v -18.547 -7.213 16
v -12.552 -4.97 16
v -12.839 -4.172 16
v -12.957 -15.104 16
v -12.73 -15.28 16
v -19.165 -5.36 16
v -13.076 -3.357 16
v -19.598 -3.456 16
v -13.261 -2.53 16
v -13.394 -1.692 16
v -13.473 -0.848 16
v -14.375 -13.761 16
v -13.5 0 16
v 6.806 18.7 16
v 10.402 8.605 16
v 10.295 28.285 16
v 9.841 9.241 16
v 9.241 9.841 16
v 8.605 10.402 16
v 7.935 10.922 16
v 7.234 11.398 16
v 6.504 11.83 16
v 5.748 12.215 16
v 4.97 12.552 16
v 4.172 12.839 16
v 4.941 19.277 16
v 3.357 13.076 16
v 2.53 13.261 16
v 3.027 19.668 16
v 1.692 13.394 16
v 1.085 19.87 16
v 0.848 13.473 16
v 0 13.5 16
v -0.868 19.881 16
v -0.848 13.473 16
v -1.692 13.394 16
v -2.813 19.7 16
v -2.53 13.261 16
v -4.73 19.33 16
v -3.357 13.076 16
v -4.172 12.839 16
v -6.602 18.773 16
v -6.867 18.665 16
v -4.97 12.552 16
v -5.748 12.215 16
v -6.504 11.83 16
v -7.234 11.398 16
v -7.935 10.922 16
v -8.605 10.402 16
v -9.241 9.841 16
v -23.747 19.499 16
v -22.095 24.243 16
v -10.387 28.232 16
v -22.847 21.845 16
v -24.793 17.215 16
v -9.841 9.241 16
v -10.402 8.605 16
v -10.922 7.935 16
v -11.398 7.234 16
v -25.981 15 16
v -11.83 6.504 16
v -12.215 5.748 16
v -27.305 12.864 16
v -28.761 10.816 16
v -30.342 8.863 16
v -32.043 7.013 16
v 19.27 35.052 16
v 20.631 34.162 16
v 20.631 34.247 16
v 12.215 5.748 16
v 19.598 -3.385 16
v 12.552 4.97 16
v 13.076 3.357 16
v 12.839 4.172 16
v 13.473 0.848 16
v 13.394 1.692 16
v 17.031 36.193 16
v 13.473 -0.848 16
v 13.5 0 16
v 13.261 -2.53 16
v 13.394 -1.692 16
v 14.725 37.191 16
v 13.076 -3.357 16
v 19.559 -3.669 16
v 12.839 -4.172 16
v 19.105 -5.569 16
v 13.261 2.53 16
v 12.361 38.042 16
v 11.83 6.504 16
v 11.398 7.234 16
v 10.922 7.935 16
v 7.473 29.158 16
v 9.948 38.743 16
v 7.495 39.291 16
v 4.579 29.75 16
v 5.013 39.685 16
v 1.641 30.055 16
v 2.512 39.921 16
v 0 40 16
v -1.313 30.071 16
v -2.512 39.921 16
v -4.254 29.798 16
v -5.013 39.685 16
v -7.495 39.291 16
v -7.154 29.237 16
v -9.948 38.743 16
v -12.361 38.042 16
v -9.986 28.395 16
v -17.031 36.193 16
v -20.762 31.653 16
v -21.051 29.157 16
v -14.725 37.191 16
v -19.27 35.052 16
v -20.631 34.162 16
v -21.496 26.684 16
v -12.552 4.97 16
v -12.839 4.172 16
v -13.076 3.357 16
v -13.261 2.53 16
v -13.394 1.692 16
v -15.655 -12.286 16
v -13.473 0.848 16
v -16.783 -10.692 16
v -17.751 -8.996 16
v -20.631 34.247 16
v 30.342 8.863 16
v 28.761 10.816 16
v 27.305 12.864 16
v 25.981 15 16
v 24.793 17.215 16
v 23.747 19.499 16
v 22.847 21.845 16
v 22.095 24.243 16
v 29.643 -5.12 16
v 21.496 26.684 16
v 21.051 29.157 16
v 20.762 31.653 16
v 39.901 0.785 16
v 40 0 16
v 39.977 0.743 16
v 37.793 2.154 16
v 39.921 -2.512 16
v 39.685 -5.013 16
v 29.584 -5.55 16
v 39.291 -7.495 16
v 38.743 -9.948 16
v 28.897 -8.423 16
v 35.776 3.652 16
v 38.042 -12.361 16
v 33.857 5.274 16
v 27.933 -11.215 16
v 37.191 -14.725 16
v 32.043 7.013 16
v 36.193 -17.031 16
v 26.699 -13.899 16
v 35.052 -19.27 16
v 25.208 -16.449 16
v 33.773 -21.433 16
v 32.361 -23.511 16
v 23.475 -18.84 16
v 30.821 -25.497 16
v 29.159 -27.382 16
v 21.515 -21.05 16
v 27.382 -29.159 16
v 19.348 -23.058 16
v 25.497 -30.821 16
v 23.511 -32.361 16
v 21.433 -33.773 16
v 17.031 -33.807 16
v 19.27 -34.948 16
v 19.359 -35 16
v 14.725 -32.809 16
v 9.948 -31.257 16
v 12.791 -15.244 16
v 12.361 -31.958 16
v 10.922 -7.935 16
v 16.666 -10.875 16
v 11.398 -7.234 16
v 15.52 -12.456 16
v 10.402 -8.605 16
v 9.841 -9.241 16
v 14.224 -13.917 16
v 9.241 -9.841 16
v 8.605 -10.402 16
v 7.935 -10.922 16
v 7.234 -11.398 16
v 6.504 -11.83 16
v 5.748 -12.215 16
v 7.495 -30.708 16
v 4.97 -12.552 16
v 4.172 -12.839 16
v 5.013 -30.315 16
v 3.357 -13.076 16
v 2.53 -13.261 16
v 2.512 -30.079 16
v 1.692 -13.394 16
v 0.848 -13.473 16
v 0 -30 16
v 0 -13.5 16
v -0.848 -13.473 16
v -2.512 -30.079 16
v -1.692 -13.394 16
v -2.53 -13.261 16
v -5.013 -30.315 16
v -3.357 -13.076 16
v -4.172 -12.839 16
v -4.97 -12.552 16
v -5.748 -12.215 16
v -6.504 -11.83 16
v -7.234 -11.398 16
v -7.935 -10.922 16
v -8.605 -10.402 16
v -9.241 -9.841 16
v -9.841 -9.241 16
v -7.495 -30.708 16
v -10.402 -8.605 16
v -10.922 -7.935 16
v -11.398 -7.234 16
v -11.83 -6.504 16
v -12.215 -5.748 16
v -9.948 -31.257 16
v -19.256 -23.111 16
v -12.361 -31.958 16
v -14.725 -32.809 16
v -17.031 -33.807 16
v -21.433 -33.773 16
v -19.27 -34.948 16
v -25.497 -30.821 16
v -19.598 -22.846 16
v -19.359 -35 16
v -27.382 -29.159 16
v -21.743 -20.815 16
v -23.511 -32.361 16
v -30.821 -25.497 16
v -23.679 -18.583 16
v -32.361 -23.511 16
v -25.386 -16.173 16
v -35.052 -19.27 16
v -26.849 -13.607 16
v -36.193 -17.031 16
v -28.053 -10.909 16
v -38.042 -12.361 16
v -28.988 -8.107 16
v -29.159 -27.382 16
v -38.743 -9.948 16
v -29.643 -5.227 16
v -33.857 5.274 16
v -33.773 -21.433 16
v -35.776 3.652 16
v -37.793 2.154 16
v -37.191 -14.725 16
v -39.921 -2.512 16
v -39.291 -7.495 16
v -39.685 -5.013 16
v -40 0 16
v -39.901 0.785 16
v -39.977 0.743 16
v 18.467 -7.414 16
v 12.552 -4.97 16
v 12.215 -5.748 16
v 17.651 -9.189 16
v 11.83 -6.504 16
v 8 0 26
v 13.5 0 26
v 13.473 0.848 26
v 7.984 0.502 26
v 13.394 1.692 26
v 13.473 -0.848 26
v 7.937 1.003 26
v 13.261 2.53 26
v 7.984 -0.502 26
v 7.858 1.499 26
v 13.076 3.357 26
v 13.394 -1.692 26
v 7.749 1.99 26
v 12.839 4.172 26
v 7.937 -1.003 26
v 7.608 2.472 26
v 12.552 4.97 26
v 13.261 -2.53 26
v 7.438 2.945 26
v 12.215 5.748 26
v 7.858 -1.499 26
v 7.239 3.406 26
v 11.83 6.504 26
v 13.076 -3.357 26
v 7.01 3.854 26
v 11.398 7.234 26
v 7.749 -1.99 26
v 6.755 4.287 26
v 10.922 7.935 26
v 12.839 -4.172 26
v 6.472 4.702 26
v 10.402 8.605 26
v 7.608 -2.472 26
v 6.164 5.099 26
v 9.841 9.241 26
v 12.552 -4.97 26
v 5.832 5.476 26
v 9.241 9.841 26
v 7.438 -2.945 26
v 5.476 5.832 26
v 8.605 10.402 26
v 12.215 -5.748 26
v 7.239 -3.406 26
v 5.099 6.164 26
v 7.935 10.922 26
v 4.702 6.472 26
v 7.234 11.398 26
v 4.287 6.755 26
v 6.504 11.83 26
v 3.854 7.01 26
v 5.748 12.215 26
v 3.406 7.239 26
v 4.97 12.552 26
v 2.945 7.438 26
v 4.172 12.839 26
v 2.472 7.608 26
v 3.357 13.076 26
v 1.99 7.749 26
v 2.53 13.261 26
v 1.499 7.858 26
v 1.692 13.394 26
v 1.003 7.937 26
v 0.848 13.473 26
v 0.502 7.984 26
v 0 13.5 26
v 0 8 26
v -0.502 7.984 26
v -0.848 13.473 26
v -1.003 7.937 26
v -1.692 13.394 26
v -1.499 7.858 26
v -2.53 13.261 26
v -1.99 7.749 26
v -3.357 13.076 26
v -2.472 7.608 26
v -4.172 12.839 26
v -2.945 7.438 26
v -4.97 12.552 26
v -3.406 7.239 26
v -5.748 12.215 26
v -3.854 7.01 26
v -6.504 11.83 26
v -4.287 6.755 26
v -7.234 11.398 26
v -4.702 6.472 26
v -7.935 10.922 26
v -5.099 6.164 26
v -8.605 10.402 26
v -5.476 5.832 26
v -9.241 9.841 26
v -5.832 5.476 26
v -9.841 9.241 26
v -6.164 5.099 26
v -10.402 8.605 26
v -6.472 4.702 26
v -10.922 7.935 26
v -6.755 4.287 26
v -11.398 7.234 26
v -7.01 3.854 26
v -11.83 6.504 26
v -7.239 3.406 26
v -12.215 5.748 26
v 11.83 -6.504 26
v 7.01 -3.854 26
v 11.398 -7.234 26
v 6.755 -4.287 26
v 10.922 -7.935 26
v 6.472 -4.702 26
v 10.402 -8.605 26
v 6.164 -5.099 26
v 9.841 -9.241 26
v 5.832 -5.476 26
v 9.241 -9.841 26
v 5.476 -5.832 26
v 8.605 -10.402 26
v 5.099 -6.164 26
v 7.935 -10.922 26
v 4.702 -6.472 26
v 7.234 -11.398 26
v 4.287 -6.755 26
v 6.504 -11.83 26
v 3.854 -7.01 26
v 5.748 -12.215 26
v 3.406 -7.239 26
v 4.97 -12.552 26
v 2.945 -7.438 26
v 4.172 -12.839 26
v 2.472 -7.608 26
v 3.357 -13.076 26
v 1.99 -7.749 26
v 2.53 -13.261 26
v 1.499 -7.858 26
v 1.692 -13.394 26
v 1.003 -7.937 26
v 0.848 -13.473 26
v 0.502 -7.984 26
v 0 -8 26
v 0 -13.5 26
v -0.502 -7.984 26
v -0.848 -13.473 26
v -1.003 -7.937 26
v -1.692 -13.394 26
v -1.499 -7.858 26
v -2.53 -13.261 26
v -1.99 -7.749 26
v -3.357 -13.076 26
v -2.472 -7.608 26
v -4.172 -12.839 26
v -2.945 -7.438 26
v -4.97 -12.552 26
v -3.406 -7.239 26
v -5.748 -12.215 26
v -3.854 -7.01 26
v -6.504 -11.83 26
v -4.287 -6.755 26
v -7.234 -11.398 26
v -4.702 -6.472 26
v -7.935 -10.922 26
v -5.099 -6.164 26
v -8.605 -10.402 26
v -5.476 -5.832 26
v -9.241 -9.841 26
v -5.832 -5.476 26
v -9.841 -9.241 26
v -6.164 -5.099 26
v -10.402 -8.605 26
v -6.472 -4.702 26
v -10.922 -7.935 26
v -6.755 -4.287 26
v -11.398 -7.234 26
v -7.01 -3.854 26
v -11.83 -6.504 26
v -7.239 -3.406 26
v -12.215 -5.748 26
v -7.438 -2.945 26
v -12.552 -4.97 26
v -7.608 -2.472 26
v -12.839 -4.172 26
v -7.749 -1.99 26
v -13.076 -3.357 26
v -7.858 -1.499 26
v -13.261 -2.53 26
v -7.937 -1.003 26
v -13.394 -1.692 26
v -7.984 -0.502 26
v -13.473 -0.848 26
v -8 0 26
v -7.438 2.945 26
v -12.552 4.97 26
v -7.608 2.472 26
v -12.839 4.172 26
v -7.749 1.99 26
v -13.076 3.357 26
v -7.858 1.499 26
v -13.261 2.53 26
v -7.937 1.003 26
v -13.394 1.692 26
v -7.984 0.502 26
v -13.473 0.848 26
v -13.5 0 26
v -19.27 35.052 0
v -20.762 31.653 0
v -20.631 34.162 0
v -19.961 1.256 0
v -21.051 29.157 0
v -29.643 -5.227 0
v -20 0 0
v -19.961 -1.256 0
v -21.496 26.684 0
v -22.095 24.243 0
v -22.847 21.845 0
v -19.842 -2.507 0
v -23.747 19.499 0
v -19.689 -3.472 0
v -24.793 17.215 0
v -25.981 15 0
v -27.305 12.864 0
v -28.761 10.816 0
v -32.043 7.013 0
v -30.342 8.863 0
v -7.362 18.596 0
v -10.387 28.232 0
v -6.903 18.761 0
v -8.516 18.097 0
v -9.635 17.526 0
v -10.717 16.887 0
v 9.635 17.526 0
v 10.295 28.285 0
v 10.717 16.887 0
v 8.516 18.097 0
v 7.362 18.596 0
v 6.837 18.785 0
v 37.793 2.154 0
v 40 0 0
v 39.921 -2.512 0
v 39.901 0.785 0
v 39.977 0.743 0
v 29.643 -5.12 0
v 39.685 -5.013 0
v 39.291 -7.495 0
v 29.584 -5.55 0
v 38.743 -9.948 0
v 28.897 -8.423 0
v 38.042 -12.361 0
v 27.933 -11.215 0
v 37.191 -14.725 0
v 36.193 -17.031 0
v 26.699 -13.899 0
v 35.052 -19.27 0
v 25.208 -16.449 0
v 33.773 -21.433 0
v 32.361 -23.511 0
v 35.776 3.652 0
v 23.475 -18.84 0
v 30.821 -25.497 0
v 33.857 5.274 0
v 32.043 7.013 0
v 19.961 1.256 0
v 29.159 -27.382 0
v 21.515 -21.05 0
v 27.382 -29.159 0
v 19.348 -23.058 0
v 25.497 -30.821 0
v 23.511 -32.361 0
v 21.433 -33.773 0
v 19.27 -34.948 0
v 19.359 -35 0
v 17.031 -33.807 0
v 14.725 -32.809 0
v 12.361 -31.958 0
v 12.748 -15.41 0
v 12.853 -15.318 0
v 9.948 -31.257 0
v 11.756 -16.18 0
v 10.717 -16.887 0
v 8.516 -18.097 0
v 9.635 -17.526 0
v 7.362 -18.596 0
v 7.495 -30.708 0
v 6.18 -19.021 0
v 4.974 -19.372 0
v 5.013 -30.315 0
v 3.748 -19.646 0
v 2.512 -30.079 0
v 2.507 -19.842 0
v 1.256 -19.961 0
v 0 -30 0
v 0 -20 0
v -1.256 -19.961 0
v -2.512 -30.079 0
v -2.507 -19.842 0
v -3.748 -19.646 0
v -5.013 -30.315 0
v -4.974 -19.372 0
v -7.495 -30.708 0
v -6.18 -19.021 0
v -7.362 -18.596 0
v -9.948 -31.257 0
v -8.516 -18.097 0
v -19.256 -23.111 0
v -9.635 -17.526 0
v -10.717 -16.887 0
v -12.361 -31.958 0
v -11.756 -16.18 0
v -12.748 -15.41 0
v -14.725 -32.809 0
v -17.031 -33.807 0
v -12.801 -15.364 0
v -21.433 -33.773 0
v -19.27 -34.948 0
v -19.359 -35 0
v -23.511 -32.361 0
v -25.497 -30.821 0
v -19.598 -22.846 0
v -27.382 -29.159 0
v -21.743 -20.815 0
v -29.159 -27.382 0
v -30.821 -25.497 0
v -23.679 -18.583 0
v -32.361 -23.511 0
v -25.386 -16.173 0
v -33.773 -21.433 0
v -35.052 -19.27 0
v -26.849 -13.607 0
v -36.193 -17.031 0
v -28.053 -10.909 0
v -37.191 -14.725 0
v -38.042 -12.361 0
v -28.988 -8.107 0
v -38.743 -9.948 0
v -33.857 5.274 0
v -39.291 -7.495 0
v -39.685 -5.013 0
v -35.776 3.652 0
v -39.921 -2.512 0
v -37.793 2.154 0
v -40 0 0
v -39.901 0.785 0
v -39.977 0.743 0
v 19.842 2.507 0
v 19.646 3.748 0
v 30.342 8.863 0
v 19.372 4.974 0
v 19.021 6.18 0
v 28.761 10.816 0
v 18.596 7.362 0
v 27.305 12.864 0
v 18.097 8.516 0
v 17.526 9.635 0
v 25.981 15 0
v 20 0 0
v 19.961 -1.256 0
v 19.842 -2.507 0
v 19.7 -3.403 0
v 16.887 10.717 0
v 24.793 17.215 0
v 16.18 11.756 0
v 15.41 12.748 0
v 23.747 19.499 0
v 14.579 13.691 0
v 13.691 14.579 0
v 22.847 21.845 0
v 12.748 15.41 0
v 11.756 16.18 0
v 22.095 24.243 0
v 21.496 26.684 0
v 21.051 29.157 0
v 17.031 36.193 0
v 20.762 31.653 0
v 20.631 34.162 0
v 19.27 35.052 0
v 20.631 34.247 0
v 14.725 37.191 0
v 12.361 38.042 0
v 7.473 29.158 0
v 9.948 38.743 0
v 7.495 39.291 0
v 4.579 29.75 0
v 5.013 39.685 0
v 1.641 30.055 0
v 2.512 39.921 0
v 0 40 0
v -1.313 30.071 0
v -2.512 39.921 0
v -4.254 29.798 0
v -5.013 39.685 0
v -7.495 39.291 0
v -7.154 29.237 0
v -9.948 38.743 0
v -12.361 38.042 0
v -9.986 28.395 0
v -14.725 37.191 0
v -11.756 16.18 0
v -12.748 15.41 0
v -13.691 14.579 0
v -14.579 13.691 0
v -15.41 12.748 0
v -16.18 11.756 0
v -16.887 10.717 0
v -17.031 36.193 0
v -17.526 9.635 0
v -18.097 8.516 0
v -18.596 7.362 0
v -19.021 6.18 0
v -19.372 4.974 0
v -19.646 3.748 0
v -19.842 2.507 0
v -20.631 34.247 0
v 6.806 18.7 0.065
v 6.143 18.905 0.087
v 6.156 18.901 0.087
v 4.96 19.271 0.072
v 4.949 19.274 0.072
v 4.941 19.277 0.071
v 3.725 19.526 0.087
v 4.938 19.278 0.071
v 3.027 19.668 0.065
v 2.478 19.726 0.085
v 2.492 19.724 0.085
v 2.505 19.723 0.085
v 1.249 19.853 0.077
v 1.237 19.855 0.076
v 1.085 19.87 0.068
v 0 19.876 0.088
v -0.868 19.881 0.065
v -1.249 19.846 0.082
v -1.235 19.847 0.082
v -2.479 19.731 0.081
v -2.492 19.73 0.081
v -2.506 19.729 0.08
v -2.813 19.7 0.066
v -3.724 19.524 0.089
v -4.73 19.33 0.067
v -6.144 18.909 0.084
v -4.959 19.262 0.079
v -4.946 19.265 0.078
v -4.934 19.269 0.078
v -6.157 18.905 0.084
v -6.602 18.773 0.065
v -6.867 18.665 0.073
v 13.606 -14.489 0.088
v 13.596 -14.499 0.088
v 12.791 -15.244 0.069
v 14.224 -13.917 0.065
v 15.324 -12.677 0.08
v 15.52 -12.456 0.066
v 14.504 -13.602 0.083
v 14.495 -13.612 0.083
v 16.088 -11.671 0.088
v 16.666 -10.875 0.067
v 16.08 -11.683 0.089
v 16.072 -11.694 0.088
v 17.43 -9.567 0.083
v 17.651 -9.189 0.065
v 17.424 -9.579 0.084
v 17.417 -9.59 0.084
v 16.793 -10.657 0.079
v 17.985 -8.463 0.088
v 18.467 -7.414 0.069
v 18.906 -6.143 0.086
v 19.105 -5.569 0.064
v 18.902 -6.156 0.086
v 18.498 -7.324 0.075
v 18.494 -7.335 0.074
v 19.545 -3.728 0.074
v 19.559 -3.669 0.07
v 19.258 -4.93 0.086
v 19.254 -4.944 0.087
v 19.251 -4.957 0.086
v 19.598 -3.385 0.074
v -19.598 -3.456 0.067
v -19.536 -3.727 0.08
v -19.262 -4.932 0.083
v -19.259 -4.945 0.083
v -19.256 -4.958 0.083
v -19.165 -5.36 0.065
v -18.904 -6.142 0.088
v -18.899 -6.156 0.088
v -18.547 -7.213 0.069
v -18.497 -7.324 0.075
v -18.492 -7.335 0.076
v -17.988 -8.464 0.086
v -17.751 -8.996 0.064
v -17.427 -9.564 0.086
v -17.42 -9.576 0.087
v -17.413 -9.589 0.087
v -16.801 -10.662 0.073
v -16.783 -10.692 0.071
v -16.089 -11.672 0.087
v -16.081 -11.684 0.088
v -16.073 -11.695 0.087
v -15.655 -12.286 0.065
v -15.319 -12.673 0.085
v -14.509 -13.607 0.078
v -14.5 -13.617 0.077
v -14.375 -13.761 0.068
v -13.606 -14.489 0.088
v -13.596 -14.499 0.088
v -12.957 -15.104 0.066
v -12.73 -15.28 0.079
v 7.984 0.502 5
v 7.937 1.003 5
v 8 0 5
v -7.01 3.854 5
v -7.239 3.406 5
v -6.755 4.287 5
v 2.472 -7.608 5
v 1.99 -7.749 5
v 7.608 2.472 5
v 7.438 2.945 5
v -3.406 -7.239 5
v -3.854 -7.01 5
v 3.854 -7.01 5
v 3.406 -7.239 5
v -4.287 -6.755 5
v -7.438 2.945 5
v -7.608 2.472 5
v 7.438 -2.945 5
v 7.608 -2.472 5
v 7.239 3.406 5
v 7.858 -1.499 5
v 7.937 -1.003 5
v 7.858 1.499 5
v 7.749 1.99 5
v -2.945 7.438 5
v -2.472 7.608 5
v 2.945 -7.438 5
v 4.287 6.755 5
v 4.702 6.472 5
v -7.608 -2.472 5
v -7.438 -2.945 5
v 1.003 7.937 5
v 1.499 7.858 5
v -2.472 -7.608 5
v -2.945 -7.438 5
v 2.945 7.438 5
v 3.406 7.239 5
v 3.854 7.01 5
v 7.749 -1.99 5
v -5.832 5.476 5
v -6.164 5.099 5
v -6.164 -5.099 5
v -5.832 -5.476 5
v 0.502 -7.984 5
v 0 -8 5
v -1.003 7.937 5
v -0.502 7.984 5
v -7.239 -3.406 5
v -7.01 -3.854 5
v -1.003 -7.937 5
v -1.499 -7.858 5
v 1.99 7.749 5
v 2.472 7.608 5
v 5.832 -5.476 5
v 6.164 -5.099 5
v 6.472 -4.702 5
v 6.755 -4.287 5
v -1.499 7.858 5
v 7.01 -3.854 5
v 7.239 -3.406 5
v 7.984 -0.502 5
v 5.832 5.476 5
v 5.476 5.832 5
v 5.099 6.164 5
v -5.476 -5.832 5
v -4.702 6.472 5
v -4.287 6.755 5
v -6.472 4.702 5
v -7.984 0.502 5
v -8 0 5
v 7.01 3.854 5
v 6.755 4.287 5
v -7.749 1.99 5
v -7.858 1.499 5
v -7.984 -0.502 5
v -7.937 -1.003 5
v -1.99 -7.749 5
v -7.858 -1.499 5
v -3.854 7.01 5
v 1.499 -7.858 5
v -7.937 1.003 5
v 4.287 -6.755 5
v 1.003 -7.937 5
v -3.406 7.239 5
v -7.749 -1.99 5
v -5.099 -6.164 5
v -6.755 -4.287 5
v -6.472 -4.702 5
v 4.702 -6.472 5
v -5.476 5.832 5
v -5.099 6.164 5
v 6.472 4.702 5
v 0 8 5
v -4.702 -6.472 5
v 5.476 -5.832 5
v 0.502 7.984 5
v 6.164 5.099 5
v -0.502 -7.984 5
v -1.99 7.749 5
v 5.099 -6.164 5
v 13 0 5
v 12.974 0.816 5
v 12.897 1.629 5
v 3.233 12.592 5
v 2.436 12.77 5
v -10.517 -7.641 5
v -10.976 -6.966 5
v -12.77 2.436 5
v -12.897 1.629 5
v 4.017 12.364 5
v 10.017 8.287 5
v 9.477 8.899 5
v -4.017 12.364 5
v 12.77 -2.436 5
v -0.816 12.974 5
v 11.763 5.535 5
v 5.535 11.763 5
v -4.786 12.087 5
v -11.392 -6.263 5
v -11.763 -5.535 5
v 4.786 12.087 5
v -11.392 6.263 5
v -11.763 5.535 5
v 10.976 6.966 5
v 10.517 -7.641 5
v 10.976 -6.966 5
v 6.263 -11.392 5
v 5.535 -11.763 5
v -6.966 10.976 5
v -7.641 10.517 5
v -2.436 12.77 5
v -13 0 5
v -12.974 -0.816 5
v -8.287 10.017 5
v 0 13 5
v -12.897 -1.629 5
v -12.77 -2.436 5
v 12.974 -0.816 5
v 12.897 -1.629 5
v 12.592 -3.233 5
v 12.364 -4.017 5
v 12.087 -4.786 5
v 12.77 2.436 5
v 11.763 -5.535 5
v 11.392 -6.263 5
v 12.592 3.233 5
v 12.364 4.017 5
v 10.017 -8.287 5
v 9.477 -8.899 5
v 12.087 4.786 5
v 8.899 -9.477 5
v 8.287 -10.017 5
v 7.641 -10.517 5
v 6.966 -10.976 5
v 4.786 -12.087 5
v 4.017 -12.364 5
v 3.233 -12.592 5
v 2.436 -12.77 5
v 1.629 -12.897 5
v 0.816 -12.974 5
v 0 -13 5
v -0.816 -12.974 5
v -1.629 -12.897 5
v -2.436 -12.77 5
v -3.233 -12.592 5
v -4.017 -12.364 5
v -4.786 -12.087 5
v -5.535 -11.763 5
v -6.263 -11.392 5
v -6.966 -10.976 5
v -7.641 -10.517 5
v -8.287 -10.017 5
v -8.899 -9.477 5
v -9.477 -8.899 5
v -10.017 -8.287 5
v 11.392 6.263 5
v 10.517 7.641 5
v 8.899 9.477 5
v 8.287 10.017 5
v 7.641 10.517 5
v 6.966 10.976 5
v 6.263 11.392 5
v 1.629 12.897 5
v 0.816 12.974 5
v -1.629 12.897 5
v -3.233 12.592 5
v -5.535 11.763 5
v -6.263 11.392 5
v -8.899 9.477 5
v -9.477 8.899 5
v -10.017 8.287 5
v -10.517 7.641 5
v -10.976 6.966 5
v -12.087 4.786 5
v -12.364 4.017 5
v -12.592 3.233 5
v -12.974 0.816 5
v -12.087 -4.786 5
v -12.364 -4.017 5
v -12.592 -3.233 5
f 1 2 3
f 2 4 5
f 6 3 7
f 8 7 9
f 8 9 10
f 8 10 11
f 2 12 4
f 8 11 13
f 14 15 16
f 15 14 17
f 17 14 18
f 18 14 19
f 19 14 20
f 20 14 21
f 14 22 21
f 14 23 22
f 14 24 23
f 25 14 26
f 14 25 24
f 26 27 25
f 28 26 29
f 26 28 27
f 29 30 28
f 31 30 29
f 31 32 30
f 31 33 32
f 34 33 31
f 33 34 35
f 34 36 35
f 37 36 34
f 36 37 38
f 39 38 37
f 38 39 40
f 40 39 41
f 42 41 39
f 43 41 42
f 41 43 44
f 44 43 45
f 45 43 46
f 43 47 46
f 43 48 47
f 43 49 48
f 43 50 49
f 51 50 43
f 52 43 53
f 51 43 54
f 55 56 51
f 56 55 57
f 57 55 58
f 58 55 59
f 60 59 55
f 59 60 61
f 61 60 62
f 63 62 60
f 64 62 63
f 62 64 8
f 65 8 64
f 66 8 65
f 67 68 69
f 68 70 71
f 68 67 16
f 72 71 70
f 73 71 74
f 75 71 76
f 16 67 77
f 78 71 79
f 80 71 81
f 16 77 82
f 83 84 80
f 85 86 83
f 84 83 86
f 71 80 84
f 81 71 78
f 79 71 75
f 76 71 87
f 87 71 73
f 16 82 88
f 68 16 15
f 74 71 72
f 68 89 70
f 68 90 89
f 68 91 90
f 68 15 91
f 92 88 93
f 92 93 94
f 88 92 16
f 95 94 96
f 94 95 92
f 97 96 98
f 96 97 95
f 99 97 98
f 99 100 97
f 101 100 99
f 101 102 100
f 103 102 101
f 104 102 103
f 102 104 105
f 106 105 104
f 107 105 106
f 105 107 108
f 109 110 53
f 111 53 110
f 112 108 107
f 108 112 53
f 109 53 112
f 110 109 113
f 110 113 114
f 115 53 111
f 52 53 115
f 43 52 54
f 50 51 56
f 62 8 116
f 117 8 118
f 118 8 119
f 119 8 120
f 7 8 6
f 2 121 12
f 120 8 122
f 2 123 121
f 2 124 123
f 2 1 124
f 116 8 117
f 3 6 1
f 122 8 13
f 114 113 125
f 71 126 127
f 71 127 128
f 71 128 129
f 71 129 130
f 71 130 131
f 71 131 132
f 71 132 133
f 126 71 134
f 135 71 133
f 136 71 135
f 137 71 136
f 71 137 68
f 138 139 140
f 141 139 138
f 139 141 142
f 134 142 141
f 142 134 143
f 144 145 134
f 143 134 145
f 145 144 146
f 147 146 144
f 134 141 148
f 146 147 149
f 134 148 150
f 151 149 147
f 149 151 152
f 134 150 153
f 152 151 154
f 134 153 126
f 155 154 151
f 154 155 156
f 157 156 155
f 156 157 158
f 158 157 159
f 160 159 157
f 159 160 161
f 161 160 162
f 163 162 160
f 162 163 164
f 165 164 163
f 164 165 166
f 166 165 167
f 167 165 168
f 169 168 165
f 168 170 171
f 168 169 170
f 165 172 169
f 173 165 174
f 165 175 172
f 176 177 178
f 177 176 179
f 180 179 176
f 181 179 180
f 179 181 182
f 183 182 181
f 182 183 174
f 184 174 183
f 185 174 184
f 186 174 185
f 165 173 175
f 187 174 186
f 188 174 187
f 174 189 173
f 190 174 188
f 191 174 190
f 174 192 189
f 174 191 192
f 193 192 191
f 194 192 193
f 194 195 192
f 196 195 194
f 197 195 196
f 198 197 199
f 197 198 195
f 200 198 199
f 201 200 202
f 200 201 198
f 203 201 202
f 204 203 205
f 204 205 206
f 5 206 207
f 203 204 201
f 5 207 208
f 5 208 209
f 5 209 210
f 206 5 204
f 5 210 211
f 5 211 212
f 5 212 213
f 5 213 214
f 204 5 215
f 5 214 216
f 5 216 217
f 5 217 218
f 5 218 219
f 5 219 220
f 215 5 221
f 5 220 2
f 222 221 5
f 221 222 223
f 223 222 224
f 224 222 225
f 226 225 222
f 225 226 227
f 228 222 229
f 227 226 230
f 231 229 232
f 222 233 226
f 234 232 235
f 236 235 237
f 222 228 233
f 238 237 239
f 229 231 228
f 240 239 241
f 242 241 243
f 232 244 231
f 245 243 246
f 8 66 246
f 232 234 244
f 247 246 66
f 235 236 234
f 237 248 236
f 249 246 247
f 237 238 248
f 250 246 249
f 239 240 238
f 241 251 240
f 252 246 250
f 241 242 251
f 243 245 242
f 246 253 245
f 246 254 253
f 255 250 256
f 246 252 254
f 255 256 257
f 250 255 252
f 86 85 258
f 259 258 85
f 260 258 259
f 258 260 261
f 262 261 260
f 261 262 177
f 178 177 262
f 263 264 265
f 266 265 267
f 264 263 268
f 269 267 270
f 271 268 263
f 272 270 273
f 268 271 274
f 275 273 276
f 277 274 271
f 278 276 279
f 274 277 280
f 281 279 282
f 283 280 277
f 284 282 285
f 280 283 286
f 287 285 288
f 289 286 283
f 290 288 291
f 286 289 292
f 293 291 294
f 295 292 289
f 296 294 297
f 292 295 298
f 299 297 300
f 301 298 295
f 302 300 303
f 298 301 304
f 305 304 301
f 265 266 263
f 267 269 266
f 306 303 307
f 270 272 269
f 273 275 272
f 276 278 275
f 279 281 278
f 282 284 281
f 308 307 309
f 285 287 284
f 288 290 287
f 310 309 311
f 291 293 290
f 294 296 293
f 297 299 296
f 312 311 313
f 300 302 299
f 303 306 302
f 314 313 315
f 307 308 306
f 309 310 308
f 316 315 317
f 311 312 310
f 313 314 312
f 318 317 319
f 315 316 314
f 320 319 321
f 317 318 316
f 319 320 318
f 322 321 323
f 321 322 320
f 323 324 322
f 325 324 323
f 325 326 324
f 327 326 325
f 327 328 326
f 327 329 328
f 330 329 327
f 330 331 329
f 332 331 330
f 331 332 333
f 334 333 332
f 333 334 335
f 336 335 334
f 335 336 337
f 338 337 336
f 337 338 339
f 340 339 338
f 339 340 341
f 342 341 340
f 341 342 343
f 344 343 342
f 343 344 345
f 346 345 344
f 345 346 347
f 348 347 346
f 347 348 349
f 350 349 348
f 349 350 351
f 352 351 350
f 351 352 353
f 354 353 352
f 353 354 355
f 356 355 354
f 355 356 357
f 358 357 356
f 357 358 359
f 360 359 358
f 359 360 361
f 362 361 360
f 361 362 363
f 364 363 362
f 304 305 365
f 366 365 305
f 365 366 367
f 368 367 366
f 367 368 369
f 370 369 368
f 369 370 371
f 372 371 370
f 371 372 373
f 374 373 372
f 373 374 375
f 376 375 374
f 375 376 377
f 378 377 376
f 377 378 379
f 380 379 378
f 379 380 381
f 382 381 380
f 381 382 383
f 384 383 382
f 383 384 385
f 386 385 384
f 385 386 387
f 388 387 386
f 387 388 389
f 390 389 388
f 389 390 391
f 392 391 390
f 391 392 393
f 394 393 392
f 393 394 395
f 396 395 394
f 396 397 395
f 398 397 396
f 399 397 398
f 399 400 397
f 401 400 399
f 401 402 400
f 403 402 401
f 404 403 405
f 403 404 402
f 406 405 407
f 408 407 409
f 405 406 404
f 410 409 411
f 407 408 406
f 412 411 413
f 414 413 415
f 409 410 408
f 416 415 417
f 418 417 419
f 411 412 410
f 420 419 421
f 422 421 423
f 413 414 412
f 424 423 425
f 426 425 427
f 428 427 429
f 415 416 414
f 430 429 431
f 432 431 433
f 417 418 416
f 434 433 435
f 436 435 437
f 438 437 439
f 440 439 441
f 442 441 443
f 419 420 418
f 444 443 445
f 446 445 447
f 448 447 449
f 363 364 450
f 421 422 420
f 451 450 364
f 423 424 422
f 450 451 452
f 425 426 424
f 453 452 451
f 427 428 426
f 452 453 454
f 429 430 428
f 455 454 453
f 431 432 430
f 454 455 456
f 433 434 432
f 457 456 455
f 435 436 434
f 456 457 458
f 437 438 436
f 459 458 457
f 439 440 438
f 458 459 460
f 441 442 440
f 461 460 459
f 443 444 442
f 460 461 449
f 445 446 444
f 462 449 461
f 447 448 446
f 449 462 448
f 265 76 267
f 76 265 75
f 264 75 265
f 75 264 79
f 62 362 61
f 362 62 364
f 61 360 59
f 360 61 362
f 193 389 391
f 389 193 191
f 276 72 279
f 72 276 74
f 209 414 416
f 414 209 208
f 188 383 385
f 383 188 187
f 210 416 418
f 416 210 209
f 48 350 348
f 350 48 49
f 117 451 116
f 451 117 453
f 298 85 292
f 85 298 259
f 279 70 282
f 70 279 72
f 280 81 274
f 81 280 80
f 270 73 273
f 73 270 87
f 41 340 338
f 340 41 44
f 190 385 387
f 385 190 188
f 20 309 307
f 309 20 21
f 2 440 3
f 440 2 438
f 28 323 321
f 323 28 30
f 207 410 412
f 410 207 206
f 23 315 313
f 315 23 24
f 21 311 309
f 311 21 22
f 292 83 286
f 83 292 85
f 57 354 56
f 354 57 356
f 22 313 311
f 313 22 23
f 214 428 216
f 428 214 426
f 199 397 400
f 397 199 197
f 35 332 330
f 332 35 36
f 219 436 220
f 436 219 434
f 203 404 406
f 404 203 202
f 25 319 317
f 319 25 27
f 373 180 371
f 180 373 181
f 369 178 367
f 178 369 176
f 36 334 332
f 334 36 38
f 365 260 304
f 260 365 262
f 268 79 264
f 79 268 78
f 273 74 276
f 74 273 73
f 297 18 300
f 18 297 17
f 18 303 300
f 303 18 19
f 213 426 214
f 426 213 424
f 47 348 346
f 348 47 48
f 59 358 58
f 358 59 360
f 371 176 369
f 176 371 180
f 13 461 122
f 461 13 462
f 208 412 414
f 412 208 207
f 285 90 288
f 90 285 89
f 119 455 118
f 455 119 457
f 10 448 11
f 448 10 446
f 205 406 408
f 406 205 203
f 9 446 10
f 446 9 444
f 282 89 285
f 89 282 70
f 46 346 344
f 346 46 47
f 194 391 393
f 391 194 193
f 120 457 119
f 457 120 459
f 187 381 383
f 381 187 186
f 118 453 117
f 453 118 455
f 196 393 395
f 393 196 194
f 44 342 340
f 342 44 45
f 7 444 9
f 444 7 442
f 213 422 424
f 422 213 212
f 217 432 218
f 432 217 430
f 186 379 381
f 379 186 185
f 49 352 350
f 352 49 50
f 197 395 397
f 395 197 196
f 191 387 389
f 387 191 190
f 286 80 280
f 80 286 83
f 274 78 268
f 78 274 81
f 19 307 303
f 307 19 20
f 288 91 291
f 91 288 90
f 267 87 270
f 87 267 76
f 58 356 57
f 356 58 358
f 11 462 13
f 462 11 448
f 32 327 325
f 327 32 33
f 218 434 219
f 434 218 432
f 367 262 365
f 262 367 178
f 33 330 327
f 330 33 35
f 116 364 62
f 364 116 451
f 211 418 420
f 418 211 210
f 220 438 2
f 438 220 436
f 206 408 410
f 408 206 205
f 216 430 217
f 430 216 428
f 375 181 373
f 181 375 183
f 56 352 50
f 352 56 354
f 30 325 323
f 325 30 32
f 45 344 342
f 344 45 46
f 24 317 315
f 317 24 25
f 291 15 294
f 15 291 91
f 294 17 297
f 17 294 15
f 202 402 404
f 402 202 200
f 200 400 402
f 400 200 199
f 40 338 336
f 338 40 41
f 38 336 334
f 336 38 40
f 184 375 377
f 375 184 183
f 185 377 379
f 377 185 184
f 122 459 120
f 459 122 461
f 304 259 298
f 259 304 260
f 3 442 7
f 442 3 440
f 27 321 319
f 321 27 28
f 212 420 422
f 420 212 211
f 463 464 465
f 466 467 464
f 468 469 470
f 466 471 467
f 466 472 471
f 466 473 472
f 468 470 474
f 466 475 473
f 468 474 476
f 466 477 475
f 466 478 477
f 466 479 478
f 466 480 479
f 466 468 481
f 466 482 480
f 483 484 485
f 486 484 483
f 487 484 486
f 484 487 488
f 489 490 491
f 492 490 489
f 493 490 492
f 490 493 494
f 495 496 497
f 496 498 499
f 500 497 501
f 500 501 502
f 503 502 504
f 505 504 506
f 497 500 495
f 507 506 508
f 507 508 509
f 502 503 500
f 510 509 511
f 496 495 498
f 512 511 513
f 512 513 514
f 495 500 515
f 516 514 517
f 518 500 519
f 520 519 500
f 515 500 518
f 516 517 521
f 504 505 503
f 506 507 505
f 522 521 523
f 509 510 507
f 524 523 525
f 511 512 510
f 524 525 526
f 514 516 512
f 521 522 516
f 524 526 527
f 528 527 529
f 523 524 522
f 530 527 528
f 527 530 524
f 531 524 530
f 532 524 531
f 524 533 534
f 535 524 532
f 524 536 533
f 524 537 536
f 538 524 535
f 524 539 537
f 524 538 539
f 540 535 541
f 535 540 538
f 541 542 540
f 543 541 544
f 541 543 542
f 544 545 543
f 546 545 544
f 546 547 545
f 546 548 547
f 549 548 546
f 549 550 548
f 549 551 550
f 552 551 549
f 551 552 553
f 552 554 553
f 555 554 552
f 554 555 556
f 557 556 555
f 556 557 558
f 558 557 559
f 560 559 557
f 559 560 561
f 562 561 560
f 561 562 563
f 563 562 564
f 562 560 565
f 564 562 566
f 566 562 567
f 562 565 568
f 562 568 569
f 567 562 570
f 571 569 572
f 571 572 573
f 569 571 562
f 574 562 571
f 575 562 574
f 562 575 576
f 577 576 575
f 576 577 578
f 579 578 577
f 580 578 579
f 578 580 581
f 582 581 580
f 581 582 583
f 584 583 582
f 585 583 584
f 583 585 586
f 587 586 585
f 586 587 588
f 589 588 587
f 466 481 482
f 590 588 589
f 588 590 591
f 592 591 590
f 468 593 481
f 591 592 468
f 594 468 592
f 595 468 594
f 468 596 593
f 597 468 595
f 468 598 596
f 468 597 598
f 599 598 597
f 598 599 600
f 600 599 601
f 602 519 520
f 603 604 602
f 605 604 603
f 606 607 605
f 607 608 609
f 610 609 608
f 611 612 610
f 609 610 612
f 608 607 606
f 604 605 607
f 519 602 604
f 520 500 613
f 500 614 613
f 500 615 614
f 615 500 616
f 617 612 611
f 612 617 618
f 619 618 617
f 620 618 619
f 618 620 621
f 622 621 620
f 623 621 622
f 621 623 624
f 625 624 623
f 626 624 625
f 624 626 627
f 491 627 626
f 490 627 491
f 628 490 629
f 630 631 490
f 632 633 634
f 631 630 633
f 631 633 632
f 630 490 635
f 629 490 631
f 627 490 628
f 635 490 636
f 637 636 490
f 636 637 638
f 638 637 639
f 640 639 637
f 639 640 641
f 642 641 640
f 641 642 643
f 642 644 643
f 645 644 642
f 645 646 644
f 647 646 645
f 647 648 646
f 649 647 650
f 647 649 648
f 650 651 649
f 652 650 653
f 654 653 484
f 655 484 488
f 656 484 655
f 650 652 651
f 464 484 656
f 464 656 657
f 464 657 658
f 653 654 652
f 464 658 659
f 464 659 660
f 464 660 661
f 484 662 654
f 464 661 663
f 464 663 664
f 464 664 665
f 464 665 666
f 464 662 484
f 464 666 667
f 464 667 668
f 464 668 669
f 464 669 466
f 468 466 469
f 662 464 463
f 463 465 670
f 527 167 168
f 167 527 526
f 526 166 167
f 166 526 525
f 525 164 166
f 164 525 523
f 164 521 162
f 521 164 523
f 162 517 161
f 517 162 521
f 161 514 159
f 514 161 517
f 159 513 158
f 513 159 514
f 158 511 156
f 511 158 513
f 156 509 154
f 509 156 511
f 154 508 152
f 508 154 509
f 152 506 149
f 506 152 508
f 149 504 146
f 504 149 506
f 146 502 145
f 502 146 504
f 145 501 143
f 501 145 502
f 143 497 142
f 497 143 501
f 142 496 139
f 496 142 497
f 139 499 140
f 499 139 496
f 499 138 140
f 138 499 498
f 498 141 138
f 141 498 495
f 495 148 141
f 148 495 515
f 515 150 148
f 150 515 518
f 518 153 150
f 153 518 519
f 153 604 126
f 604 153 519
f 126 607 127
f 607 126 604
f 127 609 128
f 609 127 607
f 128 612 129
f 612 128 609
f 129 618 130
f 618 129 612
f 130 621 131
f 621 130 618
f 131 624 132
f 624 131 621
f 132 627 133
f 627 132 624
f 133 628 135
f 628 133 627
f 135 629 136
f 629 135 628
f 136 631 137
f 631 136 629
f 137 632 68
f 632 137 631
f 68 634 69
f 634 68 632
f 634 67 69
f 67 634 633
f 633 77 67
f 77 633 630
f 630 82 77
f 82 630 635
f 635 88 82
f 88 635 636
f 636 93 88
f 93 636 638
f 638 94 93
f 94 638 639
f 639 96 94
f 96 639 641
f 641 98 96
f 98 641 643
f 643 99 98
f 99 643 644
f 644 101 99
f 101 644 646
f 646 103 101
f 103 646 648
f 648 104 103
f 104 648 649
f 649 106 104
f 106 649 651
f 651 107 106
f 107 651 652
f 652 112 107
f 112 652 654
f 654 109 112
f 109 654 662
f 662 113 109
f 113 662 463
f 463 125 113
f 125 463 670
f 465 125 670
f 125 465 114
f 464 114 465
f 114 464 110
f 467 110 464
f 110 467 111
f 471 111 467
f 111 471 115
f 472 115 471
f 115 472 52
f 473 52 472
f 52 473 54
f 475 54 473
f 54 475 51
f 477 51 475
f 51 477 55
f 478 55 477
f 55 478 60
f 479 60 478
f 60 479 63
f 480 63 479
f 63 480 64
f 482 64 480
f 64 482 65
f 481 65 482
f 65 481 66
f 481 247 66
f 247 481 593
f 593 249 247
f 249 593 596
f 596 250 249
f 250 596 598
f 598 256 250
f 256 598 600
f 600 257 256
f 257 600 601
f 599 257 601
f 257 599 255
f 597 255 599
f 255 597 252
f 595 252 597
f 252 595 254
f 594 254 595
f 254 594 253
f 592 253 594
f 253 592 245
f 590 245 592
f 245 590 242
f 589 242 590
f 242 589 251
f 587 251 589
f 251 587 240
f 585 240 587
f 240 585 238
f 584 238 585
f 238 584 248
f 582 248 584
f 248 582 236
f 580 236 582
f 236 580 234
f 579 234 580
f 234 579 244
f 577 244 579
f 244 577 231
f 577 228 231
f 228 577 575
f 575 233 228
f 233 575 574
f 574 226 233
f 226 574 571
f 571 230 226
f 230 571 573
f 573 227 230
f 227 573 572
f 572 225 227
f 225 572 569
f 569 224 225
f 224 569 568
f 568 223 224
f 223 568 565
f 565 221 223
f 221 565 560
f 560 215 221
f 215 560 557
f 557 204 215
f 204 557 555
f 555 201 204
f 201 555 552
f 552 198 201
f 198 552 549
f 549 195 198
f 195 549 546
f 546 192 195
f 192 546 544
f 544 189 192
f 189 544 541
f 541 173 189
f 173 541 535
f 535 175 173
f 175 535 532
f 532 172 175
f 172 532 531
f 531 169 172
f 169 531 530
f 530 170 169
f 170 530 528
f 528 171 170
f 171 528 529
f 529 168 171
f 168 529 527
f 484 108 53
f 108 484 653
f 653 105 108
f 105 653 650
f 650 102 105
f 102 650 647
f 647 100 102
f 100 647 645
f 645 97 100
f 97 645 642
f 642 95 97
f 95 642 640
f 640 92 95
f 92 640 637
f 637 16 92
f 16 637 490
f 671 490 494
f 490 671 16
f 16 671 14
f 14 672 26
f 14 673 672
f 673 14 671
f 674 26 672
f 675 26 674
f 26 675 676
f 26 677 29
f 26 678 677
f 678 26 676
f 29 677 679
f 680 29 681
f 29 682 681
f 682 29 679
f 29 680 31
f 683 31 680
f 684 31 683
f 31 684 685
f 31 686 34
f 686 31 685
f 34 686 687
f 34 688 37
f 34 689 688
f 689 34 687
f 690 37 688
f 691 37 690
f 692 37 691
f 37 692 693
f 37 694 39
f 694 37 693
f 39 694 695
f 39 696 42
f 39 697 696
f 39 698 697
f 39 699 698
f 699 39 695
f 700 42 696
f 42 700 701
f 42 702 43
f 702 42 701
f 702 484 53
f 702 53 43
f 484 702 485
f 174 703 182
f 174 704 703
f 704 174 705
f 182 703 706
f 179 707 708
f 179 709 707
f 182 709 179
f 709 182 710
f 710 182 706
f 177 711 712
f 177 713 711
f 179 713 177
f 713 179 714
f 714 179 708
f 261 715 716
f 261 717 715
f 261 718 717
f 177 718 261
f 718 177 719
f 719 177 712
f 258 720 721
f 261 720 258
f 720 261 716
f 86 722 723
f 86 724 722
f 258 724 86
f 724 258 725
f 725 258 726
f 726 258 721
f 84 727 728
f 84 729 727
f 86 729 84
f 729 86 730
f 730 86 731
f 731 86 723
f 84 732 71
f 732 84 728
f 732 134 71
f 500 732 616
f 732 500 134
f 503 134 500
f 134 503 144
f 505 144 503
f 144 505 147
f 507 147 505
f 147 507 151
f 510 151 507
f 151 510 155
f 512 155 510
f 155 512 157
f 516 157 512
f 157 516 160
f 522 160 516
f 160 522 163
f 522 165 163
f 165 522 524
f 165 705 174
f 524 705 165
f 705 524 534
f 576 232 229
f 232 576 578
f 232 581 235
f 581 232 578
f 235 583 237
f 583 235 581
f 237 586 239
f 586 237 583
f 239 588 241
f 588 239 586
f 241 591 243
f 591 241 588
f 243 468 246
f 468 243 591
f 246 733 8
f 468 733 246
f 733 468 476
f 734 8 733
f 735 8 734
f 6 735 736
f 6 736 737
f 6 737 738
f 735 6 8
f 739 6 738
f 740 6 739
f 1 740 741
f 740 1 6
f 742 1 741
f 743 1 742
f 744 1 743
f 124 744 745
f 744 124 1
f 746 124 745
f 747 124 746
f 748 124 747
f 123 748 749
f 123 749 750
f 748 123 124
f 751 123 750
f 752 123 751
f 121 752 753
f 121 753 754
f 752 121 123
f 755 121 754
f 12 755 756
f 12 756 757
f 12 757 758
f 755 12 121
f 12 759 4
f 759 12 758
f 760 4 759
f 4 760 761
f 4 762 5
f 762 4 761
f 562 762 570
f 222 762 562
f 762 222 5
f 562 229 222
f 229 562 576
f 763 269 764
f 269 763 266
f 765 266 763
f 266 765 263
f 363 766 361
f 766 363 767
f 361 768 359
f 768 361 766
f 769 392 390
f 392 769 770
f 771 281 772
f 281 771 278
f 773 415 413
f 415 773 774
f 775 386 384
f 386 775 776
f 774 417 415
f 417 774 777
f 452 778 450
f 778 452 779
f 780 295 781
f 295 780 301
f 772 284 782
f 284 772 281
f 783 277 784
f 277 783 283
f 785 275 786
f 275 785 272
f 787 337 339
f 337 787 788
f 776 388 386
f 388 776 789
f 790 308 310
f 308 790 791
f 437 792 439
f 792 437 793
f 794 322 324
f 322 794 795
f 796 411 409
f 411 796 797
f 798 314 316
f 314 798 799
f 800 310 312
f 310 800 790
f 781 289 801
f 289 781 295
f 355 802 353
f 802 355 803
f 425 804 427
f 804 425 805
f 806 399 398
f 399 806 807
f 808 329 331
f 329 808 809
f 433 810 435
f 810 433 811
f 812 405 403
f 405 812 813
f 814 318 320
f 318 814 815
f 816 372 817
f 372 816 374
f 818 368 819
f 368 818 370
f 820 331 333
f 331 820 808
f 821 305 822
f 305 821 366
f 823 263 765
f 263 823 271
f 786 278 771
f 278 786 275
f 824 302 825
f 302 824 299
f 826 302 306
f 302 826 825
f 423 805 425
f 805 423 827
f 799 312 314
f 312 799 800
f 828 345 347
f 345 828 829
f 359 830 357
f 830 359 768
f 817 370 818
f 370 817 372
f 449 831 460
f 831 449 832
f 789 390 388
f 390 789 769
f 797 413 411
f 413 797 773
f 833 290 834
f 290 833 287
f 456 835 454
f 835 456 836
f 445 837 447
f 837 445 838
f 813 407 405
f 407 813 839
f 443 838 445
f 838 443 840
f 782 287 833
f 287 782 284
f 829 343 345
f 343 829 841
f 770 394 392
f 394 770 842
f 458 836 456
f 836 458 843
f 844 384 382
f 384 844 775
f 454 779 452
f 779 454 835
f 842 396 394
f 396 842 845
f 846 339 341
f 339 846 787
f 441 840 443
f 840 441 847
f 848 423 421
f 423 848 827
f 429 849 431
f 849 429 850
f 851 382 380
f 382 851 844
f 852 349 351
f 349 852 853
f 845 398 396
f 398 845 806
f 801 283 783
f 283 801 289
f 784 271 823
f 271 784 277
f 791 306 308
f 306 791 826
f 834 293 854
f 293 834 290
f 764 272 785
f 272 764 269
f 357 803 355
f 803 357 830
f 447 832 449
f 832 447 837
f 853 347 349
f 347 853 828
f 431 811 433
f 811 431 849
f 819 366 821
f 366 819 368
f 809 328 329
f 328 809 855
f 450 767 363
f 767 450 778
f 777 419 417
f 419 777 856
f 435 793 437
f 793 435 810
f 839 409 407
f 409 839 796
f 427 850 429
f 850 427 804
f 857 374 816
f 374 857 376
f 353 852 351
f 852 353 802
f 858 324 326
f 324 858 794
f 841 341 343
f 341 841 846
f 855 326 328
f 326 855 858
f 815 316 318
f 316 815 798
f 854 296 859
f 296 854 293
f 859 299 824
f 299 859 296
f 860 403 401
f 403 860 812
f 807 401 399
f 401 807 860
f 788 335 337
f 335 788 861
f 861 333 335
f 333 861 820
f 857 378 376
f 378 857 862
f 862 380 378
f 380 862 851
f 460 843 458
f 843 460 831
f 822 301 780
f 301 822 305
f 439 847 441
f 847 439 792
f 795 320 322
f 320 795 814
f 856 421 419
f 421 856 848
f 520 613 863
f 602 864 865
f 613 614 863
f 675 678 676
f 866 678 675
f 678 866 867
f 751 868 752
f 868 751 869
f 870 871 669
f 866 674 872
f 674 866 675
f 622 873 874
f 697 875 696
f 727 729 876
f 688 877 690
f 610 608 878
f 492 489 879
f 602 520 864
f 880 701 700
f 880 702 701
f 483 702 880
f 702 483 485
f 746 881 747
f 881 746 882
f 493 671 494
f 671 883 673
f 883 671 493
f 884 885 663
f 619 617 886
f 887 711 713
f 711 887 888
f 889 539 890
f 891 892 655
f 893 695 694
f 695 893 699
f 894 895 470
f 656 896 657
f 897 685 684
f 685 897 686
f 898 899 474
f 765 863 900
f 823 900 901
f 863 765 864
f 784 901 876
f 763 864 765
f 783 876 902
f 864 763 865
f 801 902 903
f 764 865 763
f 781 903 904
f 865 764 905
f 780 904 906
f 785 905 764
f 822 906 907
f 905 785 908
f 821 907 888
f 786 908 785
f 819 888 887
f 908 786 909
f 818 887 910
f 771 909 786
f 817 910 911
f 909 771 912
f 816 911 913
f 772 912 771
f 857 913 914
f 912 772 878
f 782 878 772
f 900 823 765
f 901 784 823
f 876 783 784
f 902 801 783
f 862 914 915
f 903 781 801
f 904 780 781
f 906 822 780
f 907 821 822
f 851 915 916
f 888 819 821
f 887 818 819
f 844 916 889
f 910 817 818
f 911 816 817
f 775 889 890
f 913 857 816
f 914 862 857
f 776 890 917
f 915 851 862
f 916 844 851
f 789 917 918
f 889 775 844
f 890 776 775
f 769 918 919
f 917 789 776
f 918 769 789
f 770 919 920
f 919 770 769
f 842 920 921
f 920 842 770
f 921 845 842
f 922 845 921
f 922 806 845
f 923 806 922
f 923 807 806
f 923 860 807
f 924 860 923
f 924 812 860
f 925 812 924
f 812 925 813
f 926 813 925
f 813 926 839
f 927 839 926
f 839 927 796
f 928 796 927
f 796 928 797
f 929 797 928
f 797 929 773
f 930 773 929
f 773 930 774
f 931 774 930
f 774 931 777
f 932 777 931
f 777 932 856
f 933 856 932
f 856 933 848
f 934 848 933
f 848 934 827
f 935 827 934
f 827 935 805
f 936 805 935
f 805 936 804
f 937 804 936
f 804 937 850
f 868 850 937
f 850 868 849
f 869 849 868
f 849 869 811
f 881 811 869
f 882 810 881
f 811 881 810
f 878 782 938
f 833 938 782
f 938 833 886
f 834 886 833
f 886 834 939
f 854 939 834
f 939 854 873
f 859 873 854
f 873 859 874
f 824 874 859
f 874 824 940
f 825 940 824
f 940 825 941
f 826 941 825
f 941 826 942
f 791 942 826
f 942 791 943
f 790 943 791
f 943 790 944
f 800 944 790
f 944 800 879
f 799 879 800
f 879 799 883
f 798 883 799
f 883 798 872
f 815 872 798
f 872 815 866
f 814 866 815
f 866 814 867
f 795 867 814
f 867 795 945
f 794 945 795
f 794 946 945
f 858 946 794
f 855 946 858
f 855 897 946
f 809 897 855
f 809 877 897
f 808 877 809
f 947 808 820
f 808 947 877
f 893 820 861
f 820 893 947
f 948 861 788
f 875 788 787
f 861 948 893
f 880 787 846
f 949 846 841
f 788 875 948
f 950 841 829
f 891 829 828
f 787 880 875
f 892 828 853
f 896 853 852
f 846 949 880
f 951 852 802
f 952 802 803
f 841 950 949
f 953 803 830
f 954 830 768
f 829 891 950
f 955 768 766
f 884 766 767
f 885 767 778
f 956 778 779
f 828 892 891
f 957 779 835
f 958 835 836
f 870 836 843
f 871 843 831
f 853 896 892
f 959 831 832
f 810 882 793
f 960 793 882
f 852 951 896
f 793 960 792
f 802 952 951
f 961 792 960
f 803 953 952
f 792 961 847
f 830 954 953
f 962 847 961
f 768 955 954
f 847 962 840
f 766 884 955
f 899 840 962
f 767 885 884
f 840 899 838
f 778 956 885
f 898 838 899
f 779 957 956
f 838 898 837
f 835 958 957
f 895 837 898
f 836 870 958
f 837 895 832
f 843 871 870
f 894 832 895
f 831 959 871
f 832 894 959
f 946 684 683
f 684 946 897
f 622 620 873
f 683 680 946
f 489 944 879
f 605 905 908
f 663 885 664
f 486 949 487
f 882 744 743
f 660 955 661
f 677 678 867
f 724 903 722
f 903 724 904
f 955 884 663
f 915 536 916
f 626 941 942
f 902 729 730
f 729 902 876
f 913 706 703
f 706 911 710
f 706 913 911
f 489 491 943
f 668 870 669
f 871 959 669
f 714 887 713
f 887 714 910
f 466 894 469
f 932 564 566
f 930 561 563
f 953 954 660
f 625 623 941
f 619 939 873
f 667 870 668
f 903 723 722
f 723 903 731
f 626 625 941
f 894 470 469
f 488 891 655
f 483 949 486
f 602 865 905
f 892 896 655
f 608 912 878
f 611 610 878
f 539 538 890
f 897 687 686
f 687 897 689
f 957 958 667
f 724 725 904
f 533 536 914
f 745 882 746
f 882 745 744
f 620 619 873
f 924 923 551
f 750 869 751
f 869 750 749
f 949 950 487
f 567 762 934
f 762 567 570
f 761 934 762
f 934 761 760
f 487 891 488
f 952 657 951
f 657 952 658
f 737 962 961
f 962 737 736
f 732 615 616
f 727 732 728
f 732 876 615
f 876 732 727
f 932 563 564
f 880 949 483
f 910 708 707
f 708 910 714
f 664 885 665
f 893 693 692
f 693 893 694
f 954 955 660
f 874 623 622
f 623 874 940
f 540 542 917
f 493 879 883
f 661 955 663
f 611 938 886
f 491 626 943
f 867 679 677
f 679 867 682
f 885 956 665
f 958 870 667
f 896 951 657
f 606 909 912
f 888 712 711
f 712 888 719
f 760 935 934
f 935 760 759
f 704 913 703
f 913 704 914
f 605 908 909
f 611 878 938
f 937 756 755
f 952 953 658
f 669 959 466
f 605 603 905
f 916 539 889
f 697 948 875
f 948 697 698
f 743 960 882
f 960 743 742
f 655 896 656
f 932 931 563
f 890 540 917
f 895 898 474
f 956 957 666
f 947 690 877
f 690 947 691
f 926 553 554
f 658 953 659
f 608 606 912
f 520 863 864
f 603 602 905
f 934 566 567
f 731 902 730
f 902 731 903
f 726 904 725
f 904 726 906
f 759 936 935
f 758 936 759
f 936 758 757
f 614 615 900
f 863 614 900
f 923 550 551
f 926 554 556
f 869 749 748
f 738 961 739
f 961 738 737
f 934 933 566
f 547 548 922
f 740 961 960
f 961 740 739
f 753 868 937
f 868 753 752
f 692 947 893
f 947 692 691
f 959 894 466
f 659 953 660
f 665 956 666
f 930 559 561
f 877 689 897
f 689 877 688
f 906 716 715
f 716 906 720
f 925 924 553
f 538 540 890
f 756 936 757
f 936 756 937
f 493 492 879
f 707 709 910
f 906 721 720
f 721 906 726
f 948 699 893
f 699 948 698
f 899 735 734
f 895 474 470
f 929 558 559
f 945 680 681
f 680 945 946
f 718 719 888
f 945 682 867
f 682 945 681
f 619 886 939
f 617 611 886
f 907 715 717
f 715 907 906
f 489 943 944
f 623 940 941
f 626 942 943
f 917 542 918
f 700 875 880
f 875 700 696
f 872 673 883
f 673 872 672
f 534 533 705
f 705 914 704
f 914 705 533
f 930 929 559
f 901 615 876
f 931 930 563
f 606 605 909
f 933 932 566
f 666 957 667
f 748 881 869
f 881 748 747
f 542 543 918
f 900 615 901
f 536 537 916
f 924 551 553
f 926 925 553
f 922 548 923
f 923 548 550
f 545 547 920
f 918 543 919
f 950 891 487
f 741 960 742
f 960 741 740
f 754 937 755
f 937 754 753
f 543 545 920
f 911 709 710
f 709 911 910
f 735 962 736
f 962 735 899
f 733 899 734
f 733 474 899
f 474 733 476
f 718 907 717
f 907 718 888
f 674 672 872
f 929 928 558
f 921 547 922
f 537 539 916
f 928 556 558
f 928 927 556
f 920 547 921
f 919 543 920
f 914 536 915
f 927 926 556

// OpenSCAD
//Adapter für Spulen-Abroller
//Parametrisch!


$fn=100*1;
//Spool hole diameter
numerical_slider = 27;//[20:60]

//Pizza is very tasty
module pizza(r=3.0,a=30) {
  $fn=64;
  intersection() {
    circle(r=r);
    square(r);
    rotate(a-90) square(r);
  }
};


difference(){
    linear_extrude(height=26){
        difference(){
            circle(r=40);
            for(i=[30:120:270]){
                rotate(i)translate([70,0])circle(r=40);
            };
            for(i=[70:120:450]){
                difference(){
                    rotate(i)pizza(30.1,40.2);
                    rotate(i)pizza(19.9,40.2);
                };
            };
        };
    };
    translate([0,0,16])difference(){
        cylinder(r=40,10);
        cylinder(d=numerical_slider,10);
    };
    cylinder(r=8,26);
    cylinder(r1=20,r2=13,5);
};
